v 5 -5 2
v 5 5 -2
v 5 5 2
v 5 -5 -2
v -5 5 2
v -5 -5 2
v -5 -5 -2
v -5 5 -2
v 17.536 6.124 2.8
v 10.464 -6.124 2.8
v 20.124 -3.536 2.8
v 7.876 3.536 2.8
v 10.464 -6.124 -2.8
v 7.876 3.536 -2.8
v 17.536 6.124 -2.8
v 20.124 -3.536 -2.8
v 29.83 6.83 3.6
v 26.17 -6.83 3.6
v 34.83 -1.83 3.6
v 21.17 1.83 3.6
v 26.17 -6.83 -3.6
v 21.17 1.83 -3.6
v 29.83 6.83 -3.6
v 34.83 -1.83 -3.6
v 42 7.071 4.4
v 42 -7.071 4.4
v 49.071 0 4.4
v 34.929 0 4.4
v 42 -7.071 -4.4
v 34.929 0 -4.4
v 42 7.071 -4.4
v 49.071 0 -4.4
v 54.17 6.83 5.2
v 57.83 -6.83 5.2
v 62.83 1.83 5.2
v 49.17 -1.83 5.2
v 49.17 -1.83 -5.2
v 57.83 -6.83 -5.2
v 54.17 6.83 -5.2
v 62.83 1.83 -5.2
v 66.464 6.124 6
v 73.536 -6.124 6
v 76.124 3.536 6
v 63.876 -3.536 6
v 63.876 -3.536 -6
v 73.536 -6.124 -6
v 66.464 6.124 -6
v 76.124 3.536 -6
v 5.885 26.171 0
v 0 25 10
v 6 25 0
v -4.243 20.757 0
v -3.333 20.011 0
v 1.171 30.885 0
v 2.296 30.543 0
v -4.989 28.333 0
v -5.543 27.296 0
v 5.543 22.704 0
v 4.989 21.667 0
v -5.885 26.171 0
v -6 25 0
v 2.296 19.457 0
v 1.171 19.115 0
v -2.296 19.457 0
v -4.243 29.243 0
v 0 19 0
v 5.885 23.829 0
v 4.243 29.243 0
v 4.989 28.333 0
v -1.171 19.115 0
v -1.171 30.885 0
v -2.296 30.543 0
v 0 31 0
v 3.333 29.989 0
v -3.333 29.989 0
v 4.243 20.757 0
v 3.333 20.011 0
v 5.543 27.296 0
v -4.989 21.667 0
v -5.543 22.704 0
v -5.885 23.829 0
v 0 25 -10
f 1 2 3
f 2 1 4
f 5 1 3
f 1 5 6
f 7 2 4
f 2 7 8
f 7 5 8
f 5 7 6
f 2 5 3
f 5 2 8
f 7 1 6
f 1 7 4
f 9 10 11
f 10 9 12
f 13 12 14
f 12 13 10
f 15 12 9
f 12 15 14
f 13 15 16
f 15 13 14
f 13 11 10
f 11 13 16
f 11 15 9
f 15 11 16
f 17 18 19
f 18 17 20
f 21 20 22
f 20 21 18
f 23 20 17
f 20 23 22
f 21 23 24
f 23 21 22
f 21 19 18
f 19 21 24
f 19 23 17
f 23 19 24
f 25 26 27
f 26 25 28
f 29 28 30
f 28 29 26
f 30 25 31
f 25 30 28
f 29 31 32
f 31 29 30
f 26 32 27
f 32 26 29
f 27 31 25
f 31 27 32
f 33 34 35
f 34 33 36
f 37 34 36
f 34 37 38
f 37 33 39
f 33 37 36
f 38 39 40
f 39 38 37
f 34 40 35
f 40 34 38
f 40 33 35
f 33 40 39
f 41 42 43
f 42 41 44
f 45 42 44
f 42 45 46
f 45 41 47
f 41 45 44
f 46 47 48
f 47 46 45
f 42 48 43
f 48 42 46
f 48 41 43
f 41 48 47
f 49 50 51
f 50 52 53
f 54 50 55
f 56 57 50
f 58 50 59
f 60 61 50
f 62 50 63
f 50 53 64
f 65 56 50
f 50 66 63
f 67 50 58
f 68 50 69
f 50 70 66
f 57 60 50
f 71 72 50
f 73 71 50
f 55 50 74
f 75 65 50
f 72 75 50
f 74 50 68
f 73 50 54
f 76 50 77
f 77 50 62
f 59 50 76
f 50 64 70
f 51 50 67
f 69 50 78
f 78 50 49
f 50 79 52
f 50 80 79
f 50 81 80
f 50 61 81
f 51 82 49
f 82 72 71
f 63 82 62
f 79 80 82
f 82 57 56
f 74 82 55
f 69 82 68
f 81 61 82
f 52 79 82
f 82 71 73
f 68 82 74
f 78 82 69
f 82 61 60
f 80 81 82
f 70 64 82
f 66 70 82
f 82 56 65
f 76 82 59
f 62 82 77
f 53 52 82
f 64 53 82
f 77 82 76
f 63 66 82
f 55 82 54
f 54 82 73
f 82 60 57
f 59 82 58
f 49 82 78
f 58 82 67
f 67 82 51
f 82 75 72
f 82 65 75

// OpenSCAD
// Moving, turning and scaling.
//
// Transformations apply to the child that follows them, and they nest:
// the rotate() below is applied before the translate() outside it.

for (i = [0 : 5])
    translate([i * 14, 0, 0])
        rotate([0, 0, i * 15])
            scale([1, 1, 1 + i * 0.4])
                cube([10, 10, 4], center=true);

// mirror() reflects across a plane through the origin.
translate([0, 25, 0]) {
    cylinder(h=10, r1=6, r2=0, $fn=32);
    mirror([0, 0, 1]) cylinder(h=10, r1=6, r2=0, $fn=32);
}
